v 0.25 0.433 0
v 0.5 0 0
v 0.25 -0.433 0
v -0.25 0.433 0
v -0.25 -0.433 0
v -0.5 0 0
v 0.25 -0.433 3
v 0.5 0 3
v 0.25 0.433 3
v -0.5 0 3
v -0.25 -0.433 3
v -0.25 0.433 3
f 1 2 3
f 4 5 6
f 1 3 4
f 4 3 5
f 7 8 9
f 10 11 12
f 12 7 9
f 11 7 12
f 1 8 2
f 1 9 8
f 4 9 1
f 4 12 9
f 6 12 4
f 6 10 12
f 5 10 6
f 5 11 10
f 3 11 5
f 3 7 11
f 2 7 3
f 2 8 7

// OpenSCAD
linear_extrude(height = 3) {
	polygon(points = [
		[0.5,0], [0.25,0.433013], [-0.25,0.433013], [-0.5,0], [-0.25,-0.433013], [0.25,-0.433013],
	]);
}
